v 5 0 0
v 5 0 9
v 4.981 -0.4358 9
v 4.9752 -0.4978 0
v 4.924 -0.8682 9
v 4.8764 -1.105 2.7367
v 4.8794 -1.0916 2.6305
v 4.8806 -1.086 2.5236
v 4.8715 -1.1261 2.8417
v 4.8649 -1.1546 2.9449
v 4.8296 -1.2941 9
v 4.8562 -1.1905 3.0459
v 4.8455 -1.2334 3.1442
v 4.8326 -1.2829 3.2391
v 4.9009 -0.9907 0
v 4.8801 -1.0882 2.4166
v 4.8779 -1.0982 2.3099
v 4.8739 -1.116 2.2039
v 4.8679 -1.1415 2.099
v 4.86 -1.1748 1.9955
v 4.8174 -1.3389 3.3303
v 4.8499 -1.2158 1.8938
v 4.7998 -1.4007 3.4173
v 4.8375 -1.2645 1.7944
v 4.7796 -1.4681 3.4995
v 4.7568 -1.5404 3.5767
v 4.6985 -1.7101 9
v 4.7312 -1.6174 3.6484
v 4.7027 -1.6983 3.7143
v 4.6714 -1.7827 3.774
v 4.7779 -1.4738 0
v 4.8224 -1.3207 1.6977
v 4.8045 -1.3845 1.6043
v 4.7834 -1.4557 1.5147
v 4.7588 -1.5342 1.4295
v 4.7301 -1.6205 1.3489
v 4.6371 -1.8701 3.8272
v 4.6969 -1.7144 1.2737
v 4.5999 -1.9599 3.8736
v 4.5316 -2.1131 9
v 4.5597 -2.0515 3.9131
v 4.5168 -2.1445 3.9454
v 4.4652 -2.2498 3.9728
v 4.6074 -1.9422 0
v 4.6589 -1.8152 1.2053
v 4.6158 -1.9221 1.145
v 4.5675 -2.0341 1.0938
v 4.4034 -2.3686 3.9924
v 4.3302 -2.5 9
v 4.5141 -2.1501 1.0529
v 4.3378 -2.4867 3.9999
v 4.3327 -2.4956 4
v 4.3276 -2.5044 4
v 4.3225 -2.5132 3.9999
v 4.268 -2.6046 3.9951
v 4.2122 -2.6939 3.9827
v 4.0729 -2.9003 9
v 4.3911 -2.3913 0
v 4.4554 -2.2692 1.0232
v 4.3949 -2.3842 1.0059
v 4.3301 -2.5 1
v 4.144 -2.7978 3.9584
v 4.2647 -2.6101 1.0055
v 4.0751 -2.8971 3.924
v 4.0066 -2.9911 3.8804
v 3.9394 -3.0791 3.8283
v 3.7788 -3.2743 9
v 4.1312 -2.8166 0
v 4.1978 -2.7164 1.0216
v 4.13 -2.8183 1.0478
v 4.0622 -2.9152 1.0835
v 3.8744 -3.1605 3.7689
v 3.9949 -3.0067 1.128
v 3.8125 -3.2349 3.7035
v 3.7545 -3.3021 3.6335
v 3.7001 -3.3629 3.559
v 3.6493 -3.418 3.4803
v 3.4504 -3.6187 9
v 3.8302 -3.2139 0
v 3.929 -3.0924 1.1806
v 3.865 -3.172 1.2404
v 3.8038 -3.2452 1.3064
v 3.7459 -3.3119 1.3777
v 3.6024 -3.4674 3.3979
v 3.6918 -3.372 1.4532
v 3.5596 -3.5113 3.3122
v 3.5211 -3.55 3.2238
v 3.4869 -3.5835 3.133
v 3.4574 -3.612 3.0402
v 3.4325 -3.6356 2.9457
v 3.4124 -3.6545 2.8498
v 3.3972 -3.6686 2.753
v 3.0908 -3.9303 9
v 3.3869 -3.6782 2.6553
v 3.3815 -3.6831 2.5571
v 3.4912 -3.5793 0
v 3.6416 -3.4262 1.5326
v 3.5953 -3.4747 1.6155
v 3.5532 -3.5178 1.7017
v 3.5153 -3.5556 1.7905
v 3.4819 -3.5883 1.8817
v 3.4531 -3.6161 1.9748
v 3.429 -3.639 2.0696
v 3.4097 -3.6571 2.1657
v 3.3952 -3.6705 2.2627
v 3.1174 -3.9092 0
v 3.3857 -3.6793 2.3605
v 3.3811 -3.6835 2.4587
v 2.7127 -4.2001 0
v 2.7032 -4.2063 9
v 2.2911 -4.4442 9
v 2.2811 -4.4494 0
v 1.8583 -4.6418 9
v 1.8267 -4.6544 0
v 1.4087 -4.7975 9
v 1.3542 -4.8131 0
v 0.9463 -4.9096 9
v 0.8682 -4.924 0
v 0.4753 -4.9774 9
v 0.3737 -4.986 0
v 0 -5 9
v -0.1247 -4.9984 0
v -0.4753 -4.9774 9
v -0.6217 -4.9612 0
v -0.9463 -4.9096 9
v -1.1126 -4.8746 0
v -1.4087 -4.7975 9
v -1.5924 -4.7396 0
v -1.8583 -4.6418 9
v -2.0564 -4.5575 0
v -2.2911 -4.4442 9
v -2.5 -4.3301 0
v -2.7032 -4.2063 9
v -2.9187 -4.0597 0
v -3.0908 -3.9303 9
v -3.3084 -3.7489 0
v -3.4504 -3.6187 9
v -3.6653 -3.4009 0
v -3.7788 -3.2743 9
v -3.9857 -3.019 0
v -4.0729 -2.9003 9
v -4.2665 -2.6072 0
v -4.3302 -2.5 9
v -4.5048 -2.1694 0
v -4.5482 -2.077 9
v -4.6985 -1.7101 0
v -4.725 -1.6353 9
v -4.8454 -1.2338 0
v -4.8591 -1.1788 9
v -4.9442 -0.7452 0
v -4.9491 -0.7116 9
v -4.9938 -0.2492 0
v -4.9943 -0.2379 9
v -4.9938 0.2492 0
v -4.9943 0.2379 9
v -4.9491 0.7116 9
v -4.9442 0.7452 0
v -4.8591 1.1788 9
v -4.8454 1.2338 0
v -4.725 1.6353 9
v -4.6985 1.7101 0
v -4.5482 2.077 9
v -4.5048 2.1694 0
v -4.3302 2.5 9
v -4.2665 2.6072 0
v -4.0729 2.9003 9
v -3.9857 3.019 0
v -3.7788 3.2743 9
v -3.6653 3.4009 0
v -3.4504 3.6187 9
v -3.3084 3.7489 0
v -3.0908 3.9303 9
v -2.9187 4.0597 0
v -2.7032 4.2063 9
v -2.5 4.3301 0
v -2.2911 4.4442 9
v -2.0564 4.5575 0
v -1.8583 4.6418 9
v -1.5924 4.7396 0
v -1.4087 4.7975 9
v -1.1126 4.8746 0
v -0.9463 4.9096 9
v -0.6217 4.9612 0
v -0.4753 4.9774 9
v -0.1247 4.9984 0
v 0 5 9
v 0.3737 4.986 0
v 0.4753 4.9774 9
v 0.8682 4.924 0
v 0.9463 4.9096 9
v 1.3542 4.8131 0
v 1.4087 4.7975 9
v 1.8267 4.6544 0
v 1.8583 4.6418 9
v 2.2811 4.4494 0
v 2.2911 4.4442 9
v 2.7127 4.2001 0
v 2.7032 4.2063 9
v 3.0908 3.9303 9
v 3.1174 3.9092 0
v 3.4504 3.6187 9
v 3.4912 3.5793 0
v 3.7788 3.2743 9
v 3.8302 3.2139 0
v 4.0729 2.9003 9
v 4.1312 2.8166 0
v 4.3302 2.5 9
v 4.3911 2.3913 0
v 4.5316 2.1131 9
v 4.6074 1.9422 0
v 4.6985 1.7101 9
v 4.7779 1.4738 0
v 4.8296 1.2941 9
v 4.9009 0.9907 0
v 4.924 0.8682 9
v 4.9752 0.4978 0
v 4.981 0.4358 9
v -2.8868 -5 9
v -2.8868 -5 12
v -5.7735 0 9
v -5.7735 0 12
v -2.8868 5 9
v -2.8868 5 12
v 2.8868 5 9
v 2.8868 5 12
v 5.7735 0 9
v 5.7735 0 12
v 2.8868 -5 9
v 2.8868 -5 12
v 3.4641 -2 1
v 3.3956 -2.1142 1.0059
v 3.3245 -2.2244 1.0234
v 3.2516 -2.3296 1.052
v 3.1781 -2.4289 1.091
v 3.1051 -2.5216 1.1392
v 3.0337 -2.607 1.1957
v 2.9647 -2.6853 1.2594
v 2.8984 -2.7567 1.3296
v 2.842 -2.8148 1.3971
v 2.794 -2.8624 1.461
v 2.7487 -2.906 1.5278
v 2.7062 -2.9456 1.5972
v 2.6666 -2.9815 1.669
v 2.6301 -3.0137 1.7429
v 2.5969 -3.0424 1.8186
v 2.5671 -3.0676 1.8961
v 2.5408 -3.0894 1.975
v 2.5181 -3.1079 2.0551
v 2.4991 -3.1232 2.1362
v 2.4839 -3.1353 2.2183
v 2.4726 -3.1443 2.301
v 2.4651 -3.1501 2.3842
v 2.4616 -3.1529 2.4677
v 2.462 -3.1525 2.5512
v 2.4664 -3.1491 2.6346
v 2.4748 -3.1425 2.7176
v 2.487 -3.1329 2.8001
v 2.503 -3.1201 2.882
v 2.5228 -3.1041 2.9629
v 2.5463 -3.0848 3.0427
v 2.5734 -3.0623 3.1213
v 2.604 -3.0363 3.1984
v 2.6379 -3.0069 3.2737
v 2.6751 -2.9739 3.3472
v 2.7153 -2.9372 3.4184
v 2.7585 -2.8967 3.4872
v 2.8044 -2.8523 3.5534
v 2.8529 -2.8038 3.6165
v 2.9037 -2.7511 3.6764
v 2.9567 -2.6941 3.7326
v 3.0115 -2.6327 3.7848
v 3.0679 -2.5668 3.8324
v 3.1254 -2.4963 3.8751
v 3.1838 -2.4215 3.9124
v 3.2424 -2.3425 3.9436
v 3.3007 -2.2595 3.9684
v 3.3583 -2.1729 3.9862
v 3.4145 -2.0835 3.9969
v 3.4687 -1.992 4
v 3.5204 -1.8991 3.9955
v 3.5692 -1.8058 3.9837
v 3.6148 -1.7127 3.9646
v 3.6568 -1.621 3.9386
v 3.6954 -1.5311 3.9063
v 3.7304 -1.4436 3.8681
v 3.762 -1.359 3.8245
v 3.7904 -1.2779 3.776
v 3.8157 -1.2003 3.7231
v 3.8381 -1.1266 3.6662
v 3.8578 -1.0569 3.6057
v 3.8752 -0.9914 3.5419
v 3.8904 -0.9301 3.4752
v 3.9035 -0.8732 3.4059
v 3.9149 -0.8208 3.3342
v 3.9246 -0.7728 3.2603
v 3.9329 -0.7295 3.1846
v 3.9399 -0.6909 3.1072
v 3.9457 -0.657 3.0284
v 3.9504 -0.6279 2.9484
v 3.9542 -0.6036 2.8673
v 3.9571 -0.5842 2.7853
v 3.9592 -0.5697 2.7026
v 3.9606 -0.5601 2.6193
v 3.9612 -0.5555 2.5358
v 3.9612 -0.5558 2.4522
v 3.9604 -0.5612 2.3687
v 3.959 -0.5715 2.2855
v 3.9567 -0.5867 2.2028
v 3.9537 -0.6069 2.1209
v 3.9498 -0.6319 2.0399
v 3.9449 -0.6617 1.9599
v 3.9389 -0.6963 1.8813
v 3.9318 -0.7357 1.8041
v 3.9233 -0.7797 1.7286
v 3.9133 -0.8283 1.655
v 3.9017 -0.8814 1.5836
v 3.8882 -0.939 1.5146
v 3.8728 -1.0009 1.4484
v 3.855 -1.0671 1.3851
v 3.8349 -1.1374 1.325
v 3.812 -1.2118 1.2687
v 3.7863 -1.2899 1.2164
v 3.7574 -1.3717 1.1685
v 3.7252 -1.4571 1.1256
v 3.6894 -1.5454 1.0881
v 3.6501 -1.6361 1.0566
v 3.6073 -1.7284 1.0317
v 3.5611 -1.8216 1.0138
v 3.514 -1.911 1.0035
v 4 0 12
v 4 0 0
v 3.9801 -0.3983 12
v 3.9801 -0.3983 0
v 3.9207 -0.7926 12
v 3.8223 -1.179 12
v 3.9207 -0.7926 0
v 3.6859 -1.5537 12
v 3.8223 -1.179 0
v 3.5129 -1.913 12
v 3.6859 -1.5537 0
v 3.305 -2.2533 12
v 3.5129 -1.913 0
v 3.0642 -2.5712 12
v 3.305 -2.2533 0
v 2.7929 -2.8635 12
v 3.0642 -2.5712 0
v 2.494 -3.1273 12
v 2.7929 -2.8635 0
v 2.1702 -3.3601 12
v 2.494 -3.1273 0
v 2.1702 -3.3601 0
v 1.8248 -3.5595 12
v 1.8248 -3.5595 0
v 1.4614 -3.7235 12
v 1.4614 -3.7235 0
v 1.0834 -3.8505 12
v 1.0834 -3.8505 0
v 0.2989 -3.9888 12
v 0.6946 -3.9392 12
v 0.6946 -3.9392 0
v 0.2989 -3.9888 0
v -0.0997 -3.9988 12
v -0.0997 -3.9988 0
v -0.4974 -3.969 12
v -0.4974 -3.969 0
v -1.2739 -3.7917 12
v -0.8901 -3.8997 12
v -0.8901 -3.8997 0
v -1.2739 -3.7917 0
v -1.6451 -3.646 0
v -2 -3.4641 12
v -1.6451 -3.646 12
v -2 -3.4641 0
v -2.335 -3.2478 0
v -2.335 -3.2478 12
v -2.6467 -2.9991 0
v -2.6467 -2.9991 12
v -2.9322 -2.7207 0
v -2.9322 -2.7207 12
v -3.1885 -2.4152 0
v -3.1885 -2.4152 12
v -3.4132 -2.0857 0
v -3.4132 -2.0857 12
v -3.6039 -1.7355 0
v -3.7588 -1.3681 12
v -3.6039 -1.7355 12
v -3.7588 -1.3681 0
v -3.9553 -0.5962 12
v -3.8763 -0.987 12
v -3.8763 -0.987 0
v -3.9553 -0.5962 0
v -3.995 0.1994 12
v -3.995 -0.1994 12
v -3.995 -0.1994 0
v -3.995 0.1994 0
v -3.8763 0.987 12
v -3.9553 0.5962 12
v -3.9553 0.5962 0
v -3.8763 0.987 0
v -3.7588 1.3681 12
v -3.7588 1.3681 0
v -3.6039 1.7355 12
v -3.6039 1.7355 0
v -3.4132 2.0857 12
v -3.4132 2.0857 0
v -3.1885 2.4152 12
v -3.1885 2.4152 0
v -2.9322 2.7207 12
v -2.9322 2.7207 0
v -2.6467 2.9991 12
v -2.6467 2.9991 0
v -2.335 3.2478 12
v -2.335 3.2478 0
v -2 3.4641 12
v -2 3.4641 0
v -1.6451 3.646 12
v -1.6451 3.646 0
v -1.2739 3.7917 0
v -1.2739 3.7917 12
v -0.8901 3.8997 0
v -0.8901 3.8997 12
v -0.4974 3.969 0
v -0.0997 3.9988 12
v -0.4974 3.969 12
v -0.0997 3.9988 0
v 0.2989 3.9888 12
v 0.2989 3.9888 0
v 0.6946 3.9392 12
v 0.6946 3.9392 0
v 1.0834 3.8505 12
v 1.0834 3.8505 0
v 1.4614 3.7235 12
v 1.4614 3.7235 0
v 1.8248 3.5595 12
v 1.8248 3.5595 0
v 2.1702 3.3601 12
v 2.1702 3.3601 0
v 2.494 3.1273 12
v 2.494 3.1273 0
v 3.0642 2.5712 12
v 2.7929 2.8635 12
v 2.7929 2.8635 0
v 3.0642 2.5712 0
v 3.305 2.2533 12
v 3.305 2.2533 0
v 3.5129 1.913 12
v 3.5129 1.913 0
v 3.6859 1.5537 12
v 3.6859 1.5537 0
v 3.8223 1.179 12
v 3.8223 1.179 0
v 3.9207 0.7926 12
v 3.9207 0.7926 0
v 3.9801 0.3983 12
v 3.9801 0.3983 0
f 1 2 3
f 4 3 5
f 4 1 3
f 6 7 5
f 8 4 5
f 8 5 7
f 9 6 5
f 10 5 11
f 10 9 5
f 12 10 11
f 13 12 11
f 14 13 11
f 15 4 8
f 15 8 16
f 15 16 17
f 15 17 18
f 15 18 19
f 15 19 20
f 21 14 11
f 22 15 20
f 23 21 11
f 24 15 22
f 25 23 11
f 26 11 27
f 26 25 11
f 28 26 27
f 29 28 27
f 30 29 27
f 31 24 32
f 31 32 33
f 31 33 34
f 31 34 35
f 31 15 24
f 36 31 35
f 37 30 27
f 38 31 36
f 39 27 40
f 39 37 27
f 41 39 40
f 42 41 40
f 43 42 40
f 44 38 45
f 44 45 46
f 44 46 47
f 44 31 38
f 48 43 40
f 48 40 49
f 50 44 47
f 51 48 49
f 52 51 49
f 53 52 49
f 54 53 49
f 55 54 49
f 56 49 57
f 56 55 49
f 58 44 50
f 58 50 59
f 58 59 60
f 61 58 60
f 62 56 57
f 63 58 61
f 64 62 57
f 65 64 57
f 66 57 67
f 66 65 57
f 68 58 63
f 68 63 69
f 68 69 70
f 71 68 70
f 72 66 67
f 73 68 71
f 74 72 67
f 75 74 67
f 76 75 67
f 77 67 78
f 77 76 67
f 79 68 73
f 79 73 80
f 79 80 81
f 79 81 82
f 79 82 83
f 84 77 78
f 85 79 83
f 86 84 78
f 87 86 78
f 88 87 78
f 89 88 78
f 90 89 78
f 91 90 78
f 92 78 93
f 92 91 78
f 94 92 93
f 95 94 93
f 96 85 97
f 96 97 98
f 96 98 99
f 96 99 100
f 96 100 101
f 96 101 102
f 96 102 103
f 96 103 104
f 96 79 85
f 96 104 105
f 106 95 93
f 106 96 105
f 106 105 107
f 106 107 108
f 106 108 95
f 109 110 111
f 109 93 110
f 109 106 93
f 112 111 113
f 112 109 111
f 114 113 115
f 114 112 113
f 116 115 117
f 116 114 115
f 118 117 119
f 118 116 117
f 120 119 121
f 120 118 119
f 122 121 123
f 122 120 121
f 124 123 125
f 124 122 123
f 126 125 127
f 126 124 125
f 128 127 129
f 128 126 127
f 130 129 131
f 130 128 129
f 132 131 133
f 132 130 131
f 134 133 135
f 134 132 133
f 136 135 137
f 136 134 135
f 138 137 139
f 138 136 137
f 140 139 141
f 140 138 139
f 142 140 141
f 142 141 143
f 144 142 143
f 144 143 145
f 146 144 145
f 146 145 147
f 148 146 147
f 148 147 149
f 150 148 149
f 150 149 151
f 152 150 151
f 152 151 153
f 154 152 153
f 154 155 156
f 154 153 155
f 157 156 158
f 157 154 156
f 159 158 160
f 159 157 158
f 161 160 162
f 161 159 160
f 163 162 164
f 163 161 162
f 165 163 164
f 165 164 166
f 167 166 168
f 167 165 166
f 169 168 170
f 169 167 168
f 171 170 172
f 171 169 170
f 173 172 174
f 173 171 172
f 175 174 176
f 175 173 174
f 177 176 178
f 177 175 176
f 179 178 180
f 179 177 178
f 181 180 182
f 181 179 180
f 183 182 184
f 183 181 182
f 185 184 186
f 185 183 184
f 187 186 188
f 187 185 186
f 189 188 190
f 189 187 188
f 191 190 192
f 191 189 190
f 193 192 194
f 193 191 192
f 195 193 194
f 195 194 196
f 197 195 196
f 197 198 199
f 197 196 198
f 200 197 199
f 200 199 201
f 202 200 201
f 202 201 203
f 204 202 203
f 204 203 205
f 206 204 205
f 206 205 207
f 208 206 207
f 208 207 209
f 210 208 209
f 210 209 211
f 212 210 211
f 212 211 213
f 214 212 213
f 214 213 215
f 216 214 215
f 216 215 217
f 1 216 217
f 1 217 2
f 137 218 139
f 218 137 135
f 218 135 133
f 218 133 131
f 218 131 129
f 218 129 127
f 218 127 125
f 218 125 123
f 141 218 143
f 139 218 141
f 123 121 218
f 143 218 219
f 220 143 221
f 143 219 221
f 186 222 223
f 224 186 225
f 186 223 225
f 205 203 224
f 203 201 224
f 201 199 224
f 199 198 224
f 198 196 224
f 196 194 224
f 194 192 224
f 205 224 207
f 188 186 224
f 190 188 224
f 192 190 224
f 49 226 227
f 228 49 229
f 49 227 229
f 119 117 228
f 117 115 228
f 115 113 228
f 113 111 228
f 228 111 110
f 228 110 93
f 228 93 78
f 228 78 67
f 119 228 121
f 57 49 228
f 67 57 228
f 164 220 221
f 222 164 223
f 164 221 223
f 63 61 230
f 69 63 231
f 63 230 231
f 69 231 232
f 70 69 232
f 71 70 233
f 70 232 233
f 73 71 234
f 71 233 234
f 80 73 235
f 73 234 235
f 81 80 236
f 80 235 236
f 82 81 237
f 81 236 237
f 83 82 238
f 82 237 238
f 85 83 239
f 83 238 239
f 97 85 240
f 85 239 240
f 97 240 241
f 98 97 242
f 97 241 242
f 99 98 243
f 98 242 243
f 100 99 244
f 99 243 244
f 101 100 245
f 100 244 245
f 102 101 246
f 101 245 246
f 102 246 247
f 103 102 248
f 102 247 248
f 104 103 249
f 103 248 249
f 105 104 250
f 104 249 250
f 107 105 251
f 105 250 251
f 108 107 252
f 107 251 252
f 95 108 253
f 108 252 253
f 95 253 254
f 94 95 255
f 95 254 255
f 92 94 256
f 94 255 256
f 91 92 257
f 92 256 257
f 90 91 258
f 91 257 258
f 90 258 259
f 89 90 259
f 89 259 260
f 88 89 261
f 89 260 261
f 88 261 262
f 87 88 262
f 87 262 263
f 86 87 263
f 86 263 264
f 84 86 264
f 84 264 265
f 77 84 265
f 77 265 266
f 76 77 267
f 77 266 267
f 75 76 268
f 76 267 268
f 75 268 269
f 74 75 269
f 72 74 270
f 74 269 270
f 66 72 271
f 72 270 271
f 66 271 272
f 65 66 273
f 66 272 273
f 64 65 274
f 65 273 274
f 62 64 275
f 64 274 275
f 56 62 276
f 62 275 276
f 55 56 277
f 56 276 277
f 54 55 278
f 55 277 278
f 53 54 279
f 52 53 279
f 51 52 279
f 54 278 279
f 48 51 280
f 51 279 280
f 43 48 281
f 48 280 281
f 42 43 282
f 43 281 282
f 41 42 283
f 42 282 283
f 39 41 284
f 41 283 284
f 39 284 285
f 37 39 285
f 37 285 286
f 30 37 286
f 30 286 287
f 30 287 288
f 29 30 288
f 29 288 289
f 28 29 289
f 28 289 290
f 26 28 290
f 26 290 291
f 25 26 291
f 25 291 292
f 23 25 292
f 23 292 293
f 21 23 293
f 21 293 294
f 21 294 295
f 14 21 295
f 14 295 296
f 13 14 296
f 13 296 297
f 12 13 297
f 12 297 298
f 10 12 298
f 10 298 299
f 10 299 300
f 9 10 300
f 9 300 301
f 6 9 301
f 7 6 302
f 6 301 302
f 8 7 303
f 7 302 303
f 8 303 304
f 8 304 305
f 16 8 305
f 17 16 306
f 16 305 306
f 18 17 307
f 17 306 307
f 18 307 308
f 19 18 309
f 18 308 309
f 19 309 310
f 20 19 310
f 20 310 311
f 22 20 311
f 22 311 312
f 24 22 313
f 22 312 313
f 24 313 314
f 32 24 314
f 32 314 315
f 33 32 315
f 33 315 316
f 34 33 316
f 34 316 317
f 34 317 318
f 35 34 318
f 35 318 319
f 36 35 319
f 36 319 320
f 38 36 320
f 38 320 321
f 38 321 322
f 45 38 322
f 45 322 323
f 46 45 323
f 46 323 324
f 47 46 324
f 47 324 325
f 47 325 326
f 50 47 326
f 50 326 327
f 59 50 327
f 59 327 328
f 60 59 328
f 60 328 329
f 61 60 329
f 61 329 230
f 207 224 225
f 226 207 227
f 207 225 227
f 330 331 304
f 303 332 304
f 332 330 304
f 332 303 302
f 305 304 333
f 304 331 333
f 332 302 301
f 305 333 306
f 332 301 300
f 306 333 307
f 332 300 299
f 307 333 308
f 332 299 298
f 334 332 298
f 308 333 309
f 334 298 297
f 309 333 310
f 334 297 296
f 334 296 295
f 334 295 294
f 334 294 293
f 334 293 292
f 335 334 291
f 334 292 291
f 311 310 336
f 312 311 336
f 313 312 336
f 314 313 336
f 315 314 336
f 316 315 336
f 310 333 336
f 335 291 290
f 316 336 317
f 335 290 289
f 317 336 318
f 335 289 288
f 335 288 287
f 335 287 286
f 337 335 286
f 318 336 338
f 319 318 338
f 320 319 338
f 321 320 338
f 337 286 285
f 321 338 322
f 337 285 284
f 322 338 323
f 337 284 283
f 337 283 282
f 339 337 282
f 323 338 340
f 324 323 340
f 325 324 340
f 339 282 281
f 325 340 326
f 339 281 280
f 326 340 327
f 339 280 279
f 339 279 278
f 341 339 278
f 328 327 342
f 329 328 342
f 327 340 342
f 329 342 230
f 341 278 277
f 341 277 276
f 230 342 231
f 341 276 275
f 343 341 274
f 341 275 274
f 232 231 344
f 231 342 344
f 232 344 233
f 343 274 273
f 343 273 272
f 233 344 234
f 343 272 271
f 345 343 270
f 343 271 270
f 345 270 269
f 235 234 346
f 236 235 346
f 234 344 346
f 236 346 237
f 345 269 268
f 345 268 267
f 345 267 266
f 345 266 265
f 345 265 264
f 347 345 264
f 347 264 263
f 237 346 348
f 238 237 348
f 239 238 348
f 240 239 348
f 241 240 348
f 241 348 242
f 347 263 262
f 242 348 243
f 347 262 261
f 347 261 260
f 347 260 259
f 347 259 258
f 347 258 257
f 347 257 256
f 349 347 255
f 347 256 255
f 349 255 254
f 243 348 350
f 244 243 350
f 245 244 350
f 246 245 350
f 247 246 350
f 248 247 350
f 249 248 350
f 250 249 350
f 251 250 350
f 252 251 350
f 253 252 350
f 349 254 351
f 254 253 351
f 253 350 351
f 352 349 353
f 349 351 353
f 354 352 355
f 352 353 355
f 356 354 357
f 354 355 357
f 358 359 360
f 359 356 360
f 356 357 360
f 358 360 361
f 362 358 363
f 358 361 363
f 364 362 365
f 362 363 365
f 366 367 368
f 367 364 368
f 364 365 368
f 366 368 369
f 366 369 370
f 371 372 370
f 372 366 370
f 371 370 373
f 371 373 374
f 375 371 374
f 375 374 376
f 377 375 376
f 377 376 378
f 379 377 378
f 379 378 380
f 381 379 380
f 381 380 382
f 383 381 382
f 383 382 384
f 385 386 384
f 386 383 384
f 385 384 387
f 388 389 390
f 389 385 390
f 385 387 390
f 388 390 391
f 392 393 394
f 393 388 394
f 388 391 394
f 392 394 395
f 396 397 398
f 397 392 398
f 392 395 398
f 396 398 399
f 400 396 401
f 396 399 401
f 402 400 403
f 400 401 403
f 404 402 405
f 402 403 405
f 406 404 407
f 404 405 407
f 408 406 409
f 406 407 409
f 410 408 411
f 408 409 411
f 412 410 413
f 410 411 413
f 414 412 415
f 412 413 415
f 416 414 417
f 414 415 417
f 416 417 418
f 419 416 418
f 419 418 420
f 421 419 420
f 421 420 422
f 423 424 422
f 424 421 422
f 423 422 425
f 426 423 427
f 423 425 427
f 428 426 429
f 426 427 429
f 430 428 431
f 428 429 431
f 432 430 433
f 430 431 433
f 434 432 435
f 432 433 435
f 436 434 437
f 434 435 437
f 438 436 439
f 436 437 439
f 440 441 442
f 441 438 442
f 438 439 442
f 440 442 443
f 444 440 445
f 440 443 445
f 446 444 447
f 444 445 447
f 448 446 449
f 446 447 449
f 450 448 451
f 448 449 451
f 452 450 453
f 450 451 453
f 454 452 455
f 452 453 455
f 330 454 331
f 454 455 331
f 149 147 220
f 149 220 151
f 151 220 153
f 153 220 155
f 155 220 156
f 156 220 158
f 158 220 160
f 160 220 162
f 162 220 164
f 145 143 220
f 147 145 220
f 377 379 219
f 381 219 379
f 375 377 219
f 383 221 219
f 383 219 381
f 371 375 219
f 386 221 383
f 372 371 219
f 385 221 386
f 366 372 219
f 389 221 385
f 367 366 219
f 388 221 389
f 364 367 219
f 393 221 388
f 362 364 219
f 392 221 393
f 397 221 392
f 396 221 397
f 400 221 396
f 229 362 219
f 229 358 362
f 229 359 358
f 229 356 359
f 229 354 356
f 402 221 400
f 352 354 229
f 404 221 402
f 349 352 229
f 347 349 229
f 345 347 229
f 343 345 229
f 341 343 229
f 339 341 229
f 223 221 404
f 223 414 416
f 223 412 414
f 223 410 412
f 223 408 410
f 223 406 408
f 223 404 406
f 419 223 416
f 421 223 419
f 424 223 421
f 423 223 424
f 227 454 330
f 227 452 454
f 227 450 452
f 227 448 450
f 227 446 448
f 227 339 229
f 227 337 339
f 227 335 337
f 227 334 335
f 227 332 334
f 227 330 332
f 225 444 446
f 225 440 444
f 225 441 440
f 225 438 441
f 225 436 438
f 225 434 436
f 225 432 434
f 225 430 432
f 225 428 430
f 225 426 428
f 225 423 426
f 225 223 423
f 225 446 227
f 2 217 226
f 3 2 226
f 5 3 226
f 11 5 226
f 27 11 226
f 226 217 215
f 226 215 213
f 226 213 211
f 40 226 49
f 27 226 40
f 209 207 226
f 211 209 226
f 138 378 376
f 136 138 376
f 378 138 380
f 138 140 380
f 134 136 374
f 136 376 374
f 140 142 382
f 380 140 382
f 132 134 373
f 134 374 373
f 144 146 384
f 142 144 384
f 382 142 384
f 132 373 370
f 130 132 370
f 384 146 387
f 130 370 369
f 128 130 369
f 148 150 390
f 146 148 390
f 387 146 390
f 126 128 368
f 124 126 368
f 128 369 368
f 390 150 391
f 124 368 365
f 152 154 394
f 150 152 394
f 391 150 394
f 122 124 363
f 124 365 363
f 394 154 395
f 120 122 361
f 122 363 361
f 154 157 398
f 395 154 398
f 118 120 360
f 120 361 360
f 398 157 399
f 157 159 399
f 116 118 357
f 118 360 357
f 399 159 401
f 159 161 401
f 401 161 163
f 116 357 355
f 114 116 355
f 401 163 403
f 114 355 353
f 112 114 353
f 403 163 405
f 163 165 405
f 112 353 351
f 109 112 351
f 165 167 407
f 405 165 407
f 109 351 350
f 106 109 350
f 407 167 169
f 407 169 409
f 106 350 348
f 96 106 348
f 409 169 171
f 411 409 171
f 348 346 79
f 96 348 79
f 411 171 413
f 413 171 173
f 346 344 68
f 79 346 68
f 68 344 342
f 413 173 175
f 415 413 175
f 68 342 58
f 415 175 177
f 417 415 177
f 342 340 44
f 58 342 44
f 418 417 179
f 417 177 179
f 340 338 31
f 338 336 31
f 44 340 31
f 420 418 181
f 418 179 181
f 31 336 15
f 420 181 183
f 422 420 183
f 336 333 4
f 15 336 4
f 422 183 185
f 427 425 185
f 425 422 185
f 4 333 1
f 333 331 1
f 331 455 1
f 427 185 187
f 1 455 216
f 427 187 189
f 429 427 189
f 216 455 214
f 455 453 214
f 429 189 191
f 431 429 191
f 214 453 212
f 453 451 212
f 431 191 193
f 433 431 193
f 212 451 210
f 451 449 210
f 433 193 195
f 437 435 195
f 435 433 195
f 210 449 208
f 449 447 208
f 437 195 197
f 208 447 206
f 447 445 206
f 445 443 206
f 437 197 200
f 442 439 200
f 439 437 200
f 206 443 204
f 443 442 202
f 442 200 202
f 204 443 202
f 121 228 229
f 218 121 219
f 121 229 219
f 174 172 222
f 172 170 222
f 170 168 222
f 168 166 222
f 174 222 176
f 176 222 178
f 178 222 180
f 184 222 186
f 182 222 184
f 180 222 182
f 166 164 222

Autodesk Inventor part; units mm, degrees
ref_plane "YZ Plane" through (0, 0, 0) normal (1, 0, 0) x (0, 1, 0)
ref_plane "XZ Plane" through (0, 0, 0) normal (0, 1, 0) x (-1, 0, 0)
ref_plane "XY Plane" through (0, 0, 0) normal (0, 0, 1) x (1, 0, 0)
sketch "Skizze1" plane through (0, 0, 0) normal (0, 0, 1) x (1, 0, 0)
  circle A0 centre (0, 0) radius 5
  circle A1 centre (0, 0) radius 4
  dimension "d0" = 8
  dimension "d1" = 10
extrude "Extrusion1" add sketch "Skizze1" along normal blind 12
sketch "Skizze2" plane through (0, 0, 12) normal (0, 0, 1) x (1, 0, 0)
  circle A0 centre (0, 0) radius 5 projected
  line L0 (-2.8868, 5) -> (2.8868, 5)
  line L1 (2.8868, 5) -> (5.7735, 0)
  line L2 (5.7735, 0) -> (2.8868, -5)
  line L3 (2.8868, -5) -> (-2.8868, -5)
  line L4 (-2.8868, -5) -> (-5.7735, 0)
  line L5 (-5.7735, 0) -> (-2.8868, 5)
extrude "Extrusion2" add sketch "Skizze2" against normal blind 3 contours A0 L1 L2 | A0 L0 L1 | L2 L3 A0 | A0 L5 L0 | L3 L4 A0 | A0 L4 L5
sketch "Skizze3" plane through (5.7735, 0, 12) normal (0.8660254, -0.5, 0) x (0, 0, -1)
  line L0 (0, 0) -> (0, -5.7735) projected
  line L1 (0, -2.8868) -> (12, -2.8868) construction
  point P0 (9.5, -2.8868)
  dimension "d6" = 2.5
hole "Bohrung1" at (4.3301, -2.5, 2.5) direction (-0.8660254, 0.5, 0) diameter 3 depth 4 tip angle 118
properties part number "messingnut" material "Messing, weicher Gelbton"
